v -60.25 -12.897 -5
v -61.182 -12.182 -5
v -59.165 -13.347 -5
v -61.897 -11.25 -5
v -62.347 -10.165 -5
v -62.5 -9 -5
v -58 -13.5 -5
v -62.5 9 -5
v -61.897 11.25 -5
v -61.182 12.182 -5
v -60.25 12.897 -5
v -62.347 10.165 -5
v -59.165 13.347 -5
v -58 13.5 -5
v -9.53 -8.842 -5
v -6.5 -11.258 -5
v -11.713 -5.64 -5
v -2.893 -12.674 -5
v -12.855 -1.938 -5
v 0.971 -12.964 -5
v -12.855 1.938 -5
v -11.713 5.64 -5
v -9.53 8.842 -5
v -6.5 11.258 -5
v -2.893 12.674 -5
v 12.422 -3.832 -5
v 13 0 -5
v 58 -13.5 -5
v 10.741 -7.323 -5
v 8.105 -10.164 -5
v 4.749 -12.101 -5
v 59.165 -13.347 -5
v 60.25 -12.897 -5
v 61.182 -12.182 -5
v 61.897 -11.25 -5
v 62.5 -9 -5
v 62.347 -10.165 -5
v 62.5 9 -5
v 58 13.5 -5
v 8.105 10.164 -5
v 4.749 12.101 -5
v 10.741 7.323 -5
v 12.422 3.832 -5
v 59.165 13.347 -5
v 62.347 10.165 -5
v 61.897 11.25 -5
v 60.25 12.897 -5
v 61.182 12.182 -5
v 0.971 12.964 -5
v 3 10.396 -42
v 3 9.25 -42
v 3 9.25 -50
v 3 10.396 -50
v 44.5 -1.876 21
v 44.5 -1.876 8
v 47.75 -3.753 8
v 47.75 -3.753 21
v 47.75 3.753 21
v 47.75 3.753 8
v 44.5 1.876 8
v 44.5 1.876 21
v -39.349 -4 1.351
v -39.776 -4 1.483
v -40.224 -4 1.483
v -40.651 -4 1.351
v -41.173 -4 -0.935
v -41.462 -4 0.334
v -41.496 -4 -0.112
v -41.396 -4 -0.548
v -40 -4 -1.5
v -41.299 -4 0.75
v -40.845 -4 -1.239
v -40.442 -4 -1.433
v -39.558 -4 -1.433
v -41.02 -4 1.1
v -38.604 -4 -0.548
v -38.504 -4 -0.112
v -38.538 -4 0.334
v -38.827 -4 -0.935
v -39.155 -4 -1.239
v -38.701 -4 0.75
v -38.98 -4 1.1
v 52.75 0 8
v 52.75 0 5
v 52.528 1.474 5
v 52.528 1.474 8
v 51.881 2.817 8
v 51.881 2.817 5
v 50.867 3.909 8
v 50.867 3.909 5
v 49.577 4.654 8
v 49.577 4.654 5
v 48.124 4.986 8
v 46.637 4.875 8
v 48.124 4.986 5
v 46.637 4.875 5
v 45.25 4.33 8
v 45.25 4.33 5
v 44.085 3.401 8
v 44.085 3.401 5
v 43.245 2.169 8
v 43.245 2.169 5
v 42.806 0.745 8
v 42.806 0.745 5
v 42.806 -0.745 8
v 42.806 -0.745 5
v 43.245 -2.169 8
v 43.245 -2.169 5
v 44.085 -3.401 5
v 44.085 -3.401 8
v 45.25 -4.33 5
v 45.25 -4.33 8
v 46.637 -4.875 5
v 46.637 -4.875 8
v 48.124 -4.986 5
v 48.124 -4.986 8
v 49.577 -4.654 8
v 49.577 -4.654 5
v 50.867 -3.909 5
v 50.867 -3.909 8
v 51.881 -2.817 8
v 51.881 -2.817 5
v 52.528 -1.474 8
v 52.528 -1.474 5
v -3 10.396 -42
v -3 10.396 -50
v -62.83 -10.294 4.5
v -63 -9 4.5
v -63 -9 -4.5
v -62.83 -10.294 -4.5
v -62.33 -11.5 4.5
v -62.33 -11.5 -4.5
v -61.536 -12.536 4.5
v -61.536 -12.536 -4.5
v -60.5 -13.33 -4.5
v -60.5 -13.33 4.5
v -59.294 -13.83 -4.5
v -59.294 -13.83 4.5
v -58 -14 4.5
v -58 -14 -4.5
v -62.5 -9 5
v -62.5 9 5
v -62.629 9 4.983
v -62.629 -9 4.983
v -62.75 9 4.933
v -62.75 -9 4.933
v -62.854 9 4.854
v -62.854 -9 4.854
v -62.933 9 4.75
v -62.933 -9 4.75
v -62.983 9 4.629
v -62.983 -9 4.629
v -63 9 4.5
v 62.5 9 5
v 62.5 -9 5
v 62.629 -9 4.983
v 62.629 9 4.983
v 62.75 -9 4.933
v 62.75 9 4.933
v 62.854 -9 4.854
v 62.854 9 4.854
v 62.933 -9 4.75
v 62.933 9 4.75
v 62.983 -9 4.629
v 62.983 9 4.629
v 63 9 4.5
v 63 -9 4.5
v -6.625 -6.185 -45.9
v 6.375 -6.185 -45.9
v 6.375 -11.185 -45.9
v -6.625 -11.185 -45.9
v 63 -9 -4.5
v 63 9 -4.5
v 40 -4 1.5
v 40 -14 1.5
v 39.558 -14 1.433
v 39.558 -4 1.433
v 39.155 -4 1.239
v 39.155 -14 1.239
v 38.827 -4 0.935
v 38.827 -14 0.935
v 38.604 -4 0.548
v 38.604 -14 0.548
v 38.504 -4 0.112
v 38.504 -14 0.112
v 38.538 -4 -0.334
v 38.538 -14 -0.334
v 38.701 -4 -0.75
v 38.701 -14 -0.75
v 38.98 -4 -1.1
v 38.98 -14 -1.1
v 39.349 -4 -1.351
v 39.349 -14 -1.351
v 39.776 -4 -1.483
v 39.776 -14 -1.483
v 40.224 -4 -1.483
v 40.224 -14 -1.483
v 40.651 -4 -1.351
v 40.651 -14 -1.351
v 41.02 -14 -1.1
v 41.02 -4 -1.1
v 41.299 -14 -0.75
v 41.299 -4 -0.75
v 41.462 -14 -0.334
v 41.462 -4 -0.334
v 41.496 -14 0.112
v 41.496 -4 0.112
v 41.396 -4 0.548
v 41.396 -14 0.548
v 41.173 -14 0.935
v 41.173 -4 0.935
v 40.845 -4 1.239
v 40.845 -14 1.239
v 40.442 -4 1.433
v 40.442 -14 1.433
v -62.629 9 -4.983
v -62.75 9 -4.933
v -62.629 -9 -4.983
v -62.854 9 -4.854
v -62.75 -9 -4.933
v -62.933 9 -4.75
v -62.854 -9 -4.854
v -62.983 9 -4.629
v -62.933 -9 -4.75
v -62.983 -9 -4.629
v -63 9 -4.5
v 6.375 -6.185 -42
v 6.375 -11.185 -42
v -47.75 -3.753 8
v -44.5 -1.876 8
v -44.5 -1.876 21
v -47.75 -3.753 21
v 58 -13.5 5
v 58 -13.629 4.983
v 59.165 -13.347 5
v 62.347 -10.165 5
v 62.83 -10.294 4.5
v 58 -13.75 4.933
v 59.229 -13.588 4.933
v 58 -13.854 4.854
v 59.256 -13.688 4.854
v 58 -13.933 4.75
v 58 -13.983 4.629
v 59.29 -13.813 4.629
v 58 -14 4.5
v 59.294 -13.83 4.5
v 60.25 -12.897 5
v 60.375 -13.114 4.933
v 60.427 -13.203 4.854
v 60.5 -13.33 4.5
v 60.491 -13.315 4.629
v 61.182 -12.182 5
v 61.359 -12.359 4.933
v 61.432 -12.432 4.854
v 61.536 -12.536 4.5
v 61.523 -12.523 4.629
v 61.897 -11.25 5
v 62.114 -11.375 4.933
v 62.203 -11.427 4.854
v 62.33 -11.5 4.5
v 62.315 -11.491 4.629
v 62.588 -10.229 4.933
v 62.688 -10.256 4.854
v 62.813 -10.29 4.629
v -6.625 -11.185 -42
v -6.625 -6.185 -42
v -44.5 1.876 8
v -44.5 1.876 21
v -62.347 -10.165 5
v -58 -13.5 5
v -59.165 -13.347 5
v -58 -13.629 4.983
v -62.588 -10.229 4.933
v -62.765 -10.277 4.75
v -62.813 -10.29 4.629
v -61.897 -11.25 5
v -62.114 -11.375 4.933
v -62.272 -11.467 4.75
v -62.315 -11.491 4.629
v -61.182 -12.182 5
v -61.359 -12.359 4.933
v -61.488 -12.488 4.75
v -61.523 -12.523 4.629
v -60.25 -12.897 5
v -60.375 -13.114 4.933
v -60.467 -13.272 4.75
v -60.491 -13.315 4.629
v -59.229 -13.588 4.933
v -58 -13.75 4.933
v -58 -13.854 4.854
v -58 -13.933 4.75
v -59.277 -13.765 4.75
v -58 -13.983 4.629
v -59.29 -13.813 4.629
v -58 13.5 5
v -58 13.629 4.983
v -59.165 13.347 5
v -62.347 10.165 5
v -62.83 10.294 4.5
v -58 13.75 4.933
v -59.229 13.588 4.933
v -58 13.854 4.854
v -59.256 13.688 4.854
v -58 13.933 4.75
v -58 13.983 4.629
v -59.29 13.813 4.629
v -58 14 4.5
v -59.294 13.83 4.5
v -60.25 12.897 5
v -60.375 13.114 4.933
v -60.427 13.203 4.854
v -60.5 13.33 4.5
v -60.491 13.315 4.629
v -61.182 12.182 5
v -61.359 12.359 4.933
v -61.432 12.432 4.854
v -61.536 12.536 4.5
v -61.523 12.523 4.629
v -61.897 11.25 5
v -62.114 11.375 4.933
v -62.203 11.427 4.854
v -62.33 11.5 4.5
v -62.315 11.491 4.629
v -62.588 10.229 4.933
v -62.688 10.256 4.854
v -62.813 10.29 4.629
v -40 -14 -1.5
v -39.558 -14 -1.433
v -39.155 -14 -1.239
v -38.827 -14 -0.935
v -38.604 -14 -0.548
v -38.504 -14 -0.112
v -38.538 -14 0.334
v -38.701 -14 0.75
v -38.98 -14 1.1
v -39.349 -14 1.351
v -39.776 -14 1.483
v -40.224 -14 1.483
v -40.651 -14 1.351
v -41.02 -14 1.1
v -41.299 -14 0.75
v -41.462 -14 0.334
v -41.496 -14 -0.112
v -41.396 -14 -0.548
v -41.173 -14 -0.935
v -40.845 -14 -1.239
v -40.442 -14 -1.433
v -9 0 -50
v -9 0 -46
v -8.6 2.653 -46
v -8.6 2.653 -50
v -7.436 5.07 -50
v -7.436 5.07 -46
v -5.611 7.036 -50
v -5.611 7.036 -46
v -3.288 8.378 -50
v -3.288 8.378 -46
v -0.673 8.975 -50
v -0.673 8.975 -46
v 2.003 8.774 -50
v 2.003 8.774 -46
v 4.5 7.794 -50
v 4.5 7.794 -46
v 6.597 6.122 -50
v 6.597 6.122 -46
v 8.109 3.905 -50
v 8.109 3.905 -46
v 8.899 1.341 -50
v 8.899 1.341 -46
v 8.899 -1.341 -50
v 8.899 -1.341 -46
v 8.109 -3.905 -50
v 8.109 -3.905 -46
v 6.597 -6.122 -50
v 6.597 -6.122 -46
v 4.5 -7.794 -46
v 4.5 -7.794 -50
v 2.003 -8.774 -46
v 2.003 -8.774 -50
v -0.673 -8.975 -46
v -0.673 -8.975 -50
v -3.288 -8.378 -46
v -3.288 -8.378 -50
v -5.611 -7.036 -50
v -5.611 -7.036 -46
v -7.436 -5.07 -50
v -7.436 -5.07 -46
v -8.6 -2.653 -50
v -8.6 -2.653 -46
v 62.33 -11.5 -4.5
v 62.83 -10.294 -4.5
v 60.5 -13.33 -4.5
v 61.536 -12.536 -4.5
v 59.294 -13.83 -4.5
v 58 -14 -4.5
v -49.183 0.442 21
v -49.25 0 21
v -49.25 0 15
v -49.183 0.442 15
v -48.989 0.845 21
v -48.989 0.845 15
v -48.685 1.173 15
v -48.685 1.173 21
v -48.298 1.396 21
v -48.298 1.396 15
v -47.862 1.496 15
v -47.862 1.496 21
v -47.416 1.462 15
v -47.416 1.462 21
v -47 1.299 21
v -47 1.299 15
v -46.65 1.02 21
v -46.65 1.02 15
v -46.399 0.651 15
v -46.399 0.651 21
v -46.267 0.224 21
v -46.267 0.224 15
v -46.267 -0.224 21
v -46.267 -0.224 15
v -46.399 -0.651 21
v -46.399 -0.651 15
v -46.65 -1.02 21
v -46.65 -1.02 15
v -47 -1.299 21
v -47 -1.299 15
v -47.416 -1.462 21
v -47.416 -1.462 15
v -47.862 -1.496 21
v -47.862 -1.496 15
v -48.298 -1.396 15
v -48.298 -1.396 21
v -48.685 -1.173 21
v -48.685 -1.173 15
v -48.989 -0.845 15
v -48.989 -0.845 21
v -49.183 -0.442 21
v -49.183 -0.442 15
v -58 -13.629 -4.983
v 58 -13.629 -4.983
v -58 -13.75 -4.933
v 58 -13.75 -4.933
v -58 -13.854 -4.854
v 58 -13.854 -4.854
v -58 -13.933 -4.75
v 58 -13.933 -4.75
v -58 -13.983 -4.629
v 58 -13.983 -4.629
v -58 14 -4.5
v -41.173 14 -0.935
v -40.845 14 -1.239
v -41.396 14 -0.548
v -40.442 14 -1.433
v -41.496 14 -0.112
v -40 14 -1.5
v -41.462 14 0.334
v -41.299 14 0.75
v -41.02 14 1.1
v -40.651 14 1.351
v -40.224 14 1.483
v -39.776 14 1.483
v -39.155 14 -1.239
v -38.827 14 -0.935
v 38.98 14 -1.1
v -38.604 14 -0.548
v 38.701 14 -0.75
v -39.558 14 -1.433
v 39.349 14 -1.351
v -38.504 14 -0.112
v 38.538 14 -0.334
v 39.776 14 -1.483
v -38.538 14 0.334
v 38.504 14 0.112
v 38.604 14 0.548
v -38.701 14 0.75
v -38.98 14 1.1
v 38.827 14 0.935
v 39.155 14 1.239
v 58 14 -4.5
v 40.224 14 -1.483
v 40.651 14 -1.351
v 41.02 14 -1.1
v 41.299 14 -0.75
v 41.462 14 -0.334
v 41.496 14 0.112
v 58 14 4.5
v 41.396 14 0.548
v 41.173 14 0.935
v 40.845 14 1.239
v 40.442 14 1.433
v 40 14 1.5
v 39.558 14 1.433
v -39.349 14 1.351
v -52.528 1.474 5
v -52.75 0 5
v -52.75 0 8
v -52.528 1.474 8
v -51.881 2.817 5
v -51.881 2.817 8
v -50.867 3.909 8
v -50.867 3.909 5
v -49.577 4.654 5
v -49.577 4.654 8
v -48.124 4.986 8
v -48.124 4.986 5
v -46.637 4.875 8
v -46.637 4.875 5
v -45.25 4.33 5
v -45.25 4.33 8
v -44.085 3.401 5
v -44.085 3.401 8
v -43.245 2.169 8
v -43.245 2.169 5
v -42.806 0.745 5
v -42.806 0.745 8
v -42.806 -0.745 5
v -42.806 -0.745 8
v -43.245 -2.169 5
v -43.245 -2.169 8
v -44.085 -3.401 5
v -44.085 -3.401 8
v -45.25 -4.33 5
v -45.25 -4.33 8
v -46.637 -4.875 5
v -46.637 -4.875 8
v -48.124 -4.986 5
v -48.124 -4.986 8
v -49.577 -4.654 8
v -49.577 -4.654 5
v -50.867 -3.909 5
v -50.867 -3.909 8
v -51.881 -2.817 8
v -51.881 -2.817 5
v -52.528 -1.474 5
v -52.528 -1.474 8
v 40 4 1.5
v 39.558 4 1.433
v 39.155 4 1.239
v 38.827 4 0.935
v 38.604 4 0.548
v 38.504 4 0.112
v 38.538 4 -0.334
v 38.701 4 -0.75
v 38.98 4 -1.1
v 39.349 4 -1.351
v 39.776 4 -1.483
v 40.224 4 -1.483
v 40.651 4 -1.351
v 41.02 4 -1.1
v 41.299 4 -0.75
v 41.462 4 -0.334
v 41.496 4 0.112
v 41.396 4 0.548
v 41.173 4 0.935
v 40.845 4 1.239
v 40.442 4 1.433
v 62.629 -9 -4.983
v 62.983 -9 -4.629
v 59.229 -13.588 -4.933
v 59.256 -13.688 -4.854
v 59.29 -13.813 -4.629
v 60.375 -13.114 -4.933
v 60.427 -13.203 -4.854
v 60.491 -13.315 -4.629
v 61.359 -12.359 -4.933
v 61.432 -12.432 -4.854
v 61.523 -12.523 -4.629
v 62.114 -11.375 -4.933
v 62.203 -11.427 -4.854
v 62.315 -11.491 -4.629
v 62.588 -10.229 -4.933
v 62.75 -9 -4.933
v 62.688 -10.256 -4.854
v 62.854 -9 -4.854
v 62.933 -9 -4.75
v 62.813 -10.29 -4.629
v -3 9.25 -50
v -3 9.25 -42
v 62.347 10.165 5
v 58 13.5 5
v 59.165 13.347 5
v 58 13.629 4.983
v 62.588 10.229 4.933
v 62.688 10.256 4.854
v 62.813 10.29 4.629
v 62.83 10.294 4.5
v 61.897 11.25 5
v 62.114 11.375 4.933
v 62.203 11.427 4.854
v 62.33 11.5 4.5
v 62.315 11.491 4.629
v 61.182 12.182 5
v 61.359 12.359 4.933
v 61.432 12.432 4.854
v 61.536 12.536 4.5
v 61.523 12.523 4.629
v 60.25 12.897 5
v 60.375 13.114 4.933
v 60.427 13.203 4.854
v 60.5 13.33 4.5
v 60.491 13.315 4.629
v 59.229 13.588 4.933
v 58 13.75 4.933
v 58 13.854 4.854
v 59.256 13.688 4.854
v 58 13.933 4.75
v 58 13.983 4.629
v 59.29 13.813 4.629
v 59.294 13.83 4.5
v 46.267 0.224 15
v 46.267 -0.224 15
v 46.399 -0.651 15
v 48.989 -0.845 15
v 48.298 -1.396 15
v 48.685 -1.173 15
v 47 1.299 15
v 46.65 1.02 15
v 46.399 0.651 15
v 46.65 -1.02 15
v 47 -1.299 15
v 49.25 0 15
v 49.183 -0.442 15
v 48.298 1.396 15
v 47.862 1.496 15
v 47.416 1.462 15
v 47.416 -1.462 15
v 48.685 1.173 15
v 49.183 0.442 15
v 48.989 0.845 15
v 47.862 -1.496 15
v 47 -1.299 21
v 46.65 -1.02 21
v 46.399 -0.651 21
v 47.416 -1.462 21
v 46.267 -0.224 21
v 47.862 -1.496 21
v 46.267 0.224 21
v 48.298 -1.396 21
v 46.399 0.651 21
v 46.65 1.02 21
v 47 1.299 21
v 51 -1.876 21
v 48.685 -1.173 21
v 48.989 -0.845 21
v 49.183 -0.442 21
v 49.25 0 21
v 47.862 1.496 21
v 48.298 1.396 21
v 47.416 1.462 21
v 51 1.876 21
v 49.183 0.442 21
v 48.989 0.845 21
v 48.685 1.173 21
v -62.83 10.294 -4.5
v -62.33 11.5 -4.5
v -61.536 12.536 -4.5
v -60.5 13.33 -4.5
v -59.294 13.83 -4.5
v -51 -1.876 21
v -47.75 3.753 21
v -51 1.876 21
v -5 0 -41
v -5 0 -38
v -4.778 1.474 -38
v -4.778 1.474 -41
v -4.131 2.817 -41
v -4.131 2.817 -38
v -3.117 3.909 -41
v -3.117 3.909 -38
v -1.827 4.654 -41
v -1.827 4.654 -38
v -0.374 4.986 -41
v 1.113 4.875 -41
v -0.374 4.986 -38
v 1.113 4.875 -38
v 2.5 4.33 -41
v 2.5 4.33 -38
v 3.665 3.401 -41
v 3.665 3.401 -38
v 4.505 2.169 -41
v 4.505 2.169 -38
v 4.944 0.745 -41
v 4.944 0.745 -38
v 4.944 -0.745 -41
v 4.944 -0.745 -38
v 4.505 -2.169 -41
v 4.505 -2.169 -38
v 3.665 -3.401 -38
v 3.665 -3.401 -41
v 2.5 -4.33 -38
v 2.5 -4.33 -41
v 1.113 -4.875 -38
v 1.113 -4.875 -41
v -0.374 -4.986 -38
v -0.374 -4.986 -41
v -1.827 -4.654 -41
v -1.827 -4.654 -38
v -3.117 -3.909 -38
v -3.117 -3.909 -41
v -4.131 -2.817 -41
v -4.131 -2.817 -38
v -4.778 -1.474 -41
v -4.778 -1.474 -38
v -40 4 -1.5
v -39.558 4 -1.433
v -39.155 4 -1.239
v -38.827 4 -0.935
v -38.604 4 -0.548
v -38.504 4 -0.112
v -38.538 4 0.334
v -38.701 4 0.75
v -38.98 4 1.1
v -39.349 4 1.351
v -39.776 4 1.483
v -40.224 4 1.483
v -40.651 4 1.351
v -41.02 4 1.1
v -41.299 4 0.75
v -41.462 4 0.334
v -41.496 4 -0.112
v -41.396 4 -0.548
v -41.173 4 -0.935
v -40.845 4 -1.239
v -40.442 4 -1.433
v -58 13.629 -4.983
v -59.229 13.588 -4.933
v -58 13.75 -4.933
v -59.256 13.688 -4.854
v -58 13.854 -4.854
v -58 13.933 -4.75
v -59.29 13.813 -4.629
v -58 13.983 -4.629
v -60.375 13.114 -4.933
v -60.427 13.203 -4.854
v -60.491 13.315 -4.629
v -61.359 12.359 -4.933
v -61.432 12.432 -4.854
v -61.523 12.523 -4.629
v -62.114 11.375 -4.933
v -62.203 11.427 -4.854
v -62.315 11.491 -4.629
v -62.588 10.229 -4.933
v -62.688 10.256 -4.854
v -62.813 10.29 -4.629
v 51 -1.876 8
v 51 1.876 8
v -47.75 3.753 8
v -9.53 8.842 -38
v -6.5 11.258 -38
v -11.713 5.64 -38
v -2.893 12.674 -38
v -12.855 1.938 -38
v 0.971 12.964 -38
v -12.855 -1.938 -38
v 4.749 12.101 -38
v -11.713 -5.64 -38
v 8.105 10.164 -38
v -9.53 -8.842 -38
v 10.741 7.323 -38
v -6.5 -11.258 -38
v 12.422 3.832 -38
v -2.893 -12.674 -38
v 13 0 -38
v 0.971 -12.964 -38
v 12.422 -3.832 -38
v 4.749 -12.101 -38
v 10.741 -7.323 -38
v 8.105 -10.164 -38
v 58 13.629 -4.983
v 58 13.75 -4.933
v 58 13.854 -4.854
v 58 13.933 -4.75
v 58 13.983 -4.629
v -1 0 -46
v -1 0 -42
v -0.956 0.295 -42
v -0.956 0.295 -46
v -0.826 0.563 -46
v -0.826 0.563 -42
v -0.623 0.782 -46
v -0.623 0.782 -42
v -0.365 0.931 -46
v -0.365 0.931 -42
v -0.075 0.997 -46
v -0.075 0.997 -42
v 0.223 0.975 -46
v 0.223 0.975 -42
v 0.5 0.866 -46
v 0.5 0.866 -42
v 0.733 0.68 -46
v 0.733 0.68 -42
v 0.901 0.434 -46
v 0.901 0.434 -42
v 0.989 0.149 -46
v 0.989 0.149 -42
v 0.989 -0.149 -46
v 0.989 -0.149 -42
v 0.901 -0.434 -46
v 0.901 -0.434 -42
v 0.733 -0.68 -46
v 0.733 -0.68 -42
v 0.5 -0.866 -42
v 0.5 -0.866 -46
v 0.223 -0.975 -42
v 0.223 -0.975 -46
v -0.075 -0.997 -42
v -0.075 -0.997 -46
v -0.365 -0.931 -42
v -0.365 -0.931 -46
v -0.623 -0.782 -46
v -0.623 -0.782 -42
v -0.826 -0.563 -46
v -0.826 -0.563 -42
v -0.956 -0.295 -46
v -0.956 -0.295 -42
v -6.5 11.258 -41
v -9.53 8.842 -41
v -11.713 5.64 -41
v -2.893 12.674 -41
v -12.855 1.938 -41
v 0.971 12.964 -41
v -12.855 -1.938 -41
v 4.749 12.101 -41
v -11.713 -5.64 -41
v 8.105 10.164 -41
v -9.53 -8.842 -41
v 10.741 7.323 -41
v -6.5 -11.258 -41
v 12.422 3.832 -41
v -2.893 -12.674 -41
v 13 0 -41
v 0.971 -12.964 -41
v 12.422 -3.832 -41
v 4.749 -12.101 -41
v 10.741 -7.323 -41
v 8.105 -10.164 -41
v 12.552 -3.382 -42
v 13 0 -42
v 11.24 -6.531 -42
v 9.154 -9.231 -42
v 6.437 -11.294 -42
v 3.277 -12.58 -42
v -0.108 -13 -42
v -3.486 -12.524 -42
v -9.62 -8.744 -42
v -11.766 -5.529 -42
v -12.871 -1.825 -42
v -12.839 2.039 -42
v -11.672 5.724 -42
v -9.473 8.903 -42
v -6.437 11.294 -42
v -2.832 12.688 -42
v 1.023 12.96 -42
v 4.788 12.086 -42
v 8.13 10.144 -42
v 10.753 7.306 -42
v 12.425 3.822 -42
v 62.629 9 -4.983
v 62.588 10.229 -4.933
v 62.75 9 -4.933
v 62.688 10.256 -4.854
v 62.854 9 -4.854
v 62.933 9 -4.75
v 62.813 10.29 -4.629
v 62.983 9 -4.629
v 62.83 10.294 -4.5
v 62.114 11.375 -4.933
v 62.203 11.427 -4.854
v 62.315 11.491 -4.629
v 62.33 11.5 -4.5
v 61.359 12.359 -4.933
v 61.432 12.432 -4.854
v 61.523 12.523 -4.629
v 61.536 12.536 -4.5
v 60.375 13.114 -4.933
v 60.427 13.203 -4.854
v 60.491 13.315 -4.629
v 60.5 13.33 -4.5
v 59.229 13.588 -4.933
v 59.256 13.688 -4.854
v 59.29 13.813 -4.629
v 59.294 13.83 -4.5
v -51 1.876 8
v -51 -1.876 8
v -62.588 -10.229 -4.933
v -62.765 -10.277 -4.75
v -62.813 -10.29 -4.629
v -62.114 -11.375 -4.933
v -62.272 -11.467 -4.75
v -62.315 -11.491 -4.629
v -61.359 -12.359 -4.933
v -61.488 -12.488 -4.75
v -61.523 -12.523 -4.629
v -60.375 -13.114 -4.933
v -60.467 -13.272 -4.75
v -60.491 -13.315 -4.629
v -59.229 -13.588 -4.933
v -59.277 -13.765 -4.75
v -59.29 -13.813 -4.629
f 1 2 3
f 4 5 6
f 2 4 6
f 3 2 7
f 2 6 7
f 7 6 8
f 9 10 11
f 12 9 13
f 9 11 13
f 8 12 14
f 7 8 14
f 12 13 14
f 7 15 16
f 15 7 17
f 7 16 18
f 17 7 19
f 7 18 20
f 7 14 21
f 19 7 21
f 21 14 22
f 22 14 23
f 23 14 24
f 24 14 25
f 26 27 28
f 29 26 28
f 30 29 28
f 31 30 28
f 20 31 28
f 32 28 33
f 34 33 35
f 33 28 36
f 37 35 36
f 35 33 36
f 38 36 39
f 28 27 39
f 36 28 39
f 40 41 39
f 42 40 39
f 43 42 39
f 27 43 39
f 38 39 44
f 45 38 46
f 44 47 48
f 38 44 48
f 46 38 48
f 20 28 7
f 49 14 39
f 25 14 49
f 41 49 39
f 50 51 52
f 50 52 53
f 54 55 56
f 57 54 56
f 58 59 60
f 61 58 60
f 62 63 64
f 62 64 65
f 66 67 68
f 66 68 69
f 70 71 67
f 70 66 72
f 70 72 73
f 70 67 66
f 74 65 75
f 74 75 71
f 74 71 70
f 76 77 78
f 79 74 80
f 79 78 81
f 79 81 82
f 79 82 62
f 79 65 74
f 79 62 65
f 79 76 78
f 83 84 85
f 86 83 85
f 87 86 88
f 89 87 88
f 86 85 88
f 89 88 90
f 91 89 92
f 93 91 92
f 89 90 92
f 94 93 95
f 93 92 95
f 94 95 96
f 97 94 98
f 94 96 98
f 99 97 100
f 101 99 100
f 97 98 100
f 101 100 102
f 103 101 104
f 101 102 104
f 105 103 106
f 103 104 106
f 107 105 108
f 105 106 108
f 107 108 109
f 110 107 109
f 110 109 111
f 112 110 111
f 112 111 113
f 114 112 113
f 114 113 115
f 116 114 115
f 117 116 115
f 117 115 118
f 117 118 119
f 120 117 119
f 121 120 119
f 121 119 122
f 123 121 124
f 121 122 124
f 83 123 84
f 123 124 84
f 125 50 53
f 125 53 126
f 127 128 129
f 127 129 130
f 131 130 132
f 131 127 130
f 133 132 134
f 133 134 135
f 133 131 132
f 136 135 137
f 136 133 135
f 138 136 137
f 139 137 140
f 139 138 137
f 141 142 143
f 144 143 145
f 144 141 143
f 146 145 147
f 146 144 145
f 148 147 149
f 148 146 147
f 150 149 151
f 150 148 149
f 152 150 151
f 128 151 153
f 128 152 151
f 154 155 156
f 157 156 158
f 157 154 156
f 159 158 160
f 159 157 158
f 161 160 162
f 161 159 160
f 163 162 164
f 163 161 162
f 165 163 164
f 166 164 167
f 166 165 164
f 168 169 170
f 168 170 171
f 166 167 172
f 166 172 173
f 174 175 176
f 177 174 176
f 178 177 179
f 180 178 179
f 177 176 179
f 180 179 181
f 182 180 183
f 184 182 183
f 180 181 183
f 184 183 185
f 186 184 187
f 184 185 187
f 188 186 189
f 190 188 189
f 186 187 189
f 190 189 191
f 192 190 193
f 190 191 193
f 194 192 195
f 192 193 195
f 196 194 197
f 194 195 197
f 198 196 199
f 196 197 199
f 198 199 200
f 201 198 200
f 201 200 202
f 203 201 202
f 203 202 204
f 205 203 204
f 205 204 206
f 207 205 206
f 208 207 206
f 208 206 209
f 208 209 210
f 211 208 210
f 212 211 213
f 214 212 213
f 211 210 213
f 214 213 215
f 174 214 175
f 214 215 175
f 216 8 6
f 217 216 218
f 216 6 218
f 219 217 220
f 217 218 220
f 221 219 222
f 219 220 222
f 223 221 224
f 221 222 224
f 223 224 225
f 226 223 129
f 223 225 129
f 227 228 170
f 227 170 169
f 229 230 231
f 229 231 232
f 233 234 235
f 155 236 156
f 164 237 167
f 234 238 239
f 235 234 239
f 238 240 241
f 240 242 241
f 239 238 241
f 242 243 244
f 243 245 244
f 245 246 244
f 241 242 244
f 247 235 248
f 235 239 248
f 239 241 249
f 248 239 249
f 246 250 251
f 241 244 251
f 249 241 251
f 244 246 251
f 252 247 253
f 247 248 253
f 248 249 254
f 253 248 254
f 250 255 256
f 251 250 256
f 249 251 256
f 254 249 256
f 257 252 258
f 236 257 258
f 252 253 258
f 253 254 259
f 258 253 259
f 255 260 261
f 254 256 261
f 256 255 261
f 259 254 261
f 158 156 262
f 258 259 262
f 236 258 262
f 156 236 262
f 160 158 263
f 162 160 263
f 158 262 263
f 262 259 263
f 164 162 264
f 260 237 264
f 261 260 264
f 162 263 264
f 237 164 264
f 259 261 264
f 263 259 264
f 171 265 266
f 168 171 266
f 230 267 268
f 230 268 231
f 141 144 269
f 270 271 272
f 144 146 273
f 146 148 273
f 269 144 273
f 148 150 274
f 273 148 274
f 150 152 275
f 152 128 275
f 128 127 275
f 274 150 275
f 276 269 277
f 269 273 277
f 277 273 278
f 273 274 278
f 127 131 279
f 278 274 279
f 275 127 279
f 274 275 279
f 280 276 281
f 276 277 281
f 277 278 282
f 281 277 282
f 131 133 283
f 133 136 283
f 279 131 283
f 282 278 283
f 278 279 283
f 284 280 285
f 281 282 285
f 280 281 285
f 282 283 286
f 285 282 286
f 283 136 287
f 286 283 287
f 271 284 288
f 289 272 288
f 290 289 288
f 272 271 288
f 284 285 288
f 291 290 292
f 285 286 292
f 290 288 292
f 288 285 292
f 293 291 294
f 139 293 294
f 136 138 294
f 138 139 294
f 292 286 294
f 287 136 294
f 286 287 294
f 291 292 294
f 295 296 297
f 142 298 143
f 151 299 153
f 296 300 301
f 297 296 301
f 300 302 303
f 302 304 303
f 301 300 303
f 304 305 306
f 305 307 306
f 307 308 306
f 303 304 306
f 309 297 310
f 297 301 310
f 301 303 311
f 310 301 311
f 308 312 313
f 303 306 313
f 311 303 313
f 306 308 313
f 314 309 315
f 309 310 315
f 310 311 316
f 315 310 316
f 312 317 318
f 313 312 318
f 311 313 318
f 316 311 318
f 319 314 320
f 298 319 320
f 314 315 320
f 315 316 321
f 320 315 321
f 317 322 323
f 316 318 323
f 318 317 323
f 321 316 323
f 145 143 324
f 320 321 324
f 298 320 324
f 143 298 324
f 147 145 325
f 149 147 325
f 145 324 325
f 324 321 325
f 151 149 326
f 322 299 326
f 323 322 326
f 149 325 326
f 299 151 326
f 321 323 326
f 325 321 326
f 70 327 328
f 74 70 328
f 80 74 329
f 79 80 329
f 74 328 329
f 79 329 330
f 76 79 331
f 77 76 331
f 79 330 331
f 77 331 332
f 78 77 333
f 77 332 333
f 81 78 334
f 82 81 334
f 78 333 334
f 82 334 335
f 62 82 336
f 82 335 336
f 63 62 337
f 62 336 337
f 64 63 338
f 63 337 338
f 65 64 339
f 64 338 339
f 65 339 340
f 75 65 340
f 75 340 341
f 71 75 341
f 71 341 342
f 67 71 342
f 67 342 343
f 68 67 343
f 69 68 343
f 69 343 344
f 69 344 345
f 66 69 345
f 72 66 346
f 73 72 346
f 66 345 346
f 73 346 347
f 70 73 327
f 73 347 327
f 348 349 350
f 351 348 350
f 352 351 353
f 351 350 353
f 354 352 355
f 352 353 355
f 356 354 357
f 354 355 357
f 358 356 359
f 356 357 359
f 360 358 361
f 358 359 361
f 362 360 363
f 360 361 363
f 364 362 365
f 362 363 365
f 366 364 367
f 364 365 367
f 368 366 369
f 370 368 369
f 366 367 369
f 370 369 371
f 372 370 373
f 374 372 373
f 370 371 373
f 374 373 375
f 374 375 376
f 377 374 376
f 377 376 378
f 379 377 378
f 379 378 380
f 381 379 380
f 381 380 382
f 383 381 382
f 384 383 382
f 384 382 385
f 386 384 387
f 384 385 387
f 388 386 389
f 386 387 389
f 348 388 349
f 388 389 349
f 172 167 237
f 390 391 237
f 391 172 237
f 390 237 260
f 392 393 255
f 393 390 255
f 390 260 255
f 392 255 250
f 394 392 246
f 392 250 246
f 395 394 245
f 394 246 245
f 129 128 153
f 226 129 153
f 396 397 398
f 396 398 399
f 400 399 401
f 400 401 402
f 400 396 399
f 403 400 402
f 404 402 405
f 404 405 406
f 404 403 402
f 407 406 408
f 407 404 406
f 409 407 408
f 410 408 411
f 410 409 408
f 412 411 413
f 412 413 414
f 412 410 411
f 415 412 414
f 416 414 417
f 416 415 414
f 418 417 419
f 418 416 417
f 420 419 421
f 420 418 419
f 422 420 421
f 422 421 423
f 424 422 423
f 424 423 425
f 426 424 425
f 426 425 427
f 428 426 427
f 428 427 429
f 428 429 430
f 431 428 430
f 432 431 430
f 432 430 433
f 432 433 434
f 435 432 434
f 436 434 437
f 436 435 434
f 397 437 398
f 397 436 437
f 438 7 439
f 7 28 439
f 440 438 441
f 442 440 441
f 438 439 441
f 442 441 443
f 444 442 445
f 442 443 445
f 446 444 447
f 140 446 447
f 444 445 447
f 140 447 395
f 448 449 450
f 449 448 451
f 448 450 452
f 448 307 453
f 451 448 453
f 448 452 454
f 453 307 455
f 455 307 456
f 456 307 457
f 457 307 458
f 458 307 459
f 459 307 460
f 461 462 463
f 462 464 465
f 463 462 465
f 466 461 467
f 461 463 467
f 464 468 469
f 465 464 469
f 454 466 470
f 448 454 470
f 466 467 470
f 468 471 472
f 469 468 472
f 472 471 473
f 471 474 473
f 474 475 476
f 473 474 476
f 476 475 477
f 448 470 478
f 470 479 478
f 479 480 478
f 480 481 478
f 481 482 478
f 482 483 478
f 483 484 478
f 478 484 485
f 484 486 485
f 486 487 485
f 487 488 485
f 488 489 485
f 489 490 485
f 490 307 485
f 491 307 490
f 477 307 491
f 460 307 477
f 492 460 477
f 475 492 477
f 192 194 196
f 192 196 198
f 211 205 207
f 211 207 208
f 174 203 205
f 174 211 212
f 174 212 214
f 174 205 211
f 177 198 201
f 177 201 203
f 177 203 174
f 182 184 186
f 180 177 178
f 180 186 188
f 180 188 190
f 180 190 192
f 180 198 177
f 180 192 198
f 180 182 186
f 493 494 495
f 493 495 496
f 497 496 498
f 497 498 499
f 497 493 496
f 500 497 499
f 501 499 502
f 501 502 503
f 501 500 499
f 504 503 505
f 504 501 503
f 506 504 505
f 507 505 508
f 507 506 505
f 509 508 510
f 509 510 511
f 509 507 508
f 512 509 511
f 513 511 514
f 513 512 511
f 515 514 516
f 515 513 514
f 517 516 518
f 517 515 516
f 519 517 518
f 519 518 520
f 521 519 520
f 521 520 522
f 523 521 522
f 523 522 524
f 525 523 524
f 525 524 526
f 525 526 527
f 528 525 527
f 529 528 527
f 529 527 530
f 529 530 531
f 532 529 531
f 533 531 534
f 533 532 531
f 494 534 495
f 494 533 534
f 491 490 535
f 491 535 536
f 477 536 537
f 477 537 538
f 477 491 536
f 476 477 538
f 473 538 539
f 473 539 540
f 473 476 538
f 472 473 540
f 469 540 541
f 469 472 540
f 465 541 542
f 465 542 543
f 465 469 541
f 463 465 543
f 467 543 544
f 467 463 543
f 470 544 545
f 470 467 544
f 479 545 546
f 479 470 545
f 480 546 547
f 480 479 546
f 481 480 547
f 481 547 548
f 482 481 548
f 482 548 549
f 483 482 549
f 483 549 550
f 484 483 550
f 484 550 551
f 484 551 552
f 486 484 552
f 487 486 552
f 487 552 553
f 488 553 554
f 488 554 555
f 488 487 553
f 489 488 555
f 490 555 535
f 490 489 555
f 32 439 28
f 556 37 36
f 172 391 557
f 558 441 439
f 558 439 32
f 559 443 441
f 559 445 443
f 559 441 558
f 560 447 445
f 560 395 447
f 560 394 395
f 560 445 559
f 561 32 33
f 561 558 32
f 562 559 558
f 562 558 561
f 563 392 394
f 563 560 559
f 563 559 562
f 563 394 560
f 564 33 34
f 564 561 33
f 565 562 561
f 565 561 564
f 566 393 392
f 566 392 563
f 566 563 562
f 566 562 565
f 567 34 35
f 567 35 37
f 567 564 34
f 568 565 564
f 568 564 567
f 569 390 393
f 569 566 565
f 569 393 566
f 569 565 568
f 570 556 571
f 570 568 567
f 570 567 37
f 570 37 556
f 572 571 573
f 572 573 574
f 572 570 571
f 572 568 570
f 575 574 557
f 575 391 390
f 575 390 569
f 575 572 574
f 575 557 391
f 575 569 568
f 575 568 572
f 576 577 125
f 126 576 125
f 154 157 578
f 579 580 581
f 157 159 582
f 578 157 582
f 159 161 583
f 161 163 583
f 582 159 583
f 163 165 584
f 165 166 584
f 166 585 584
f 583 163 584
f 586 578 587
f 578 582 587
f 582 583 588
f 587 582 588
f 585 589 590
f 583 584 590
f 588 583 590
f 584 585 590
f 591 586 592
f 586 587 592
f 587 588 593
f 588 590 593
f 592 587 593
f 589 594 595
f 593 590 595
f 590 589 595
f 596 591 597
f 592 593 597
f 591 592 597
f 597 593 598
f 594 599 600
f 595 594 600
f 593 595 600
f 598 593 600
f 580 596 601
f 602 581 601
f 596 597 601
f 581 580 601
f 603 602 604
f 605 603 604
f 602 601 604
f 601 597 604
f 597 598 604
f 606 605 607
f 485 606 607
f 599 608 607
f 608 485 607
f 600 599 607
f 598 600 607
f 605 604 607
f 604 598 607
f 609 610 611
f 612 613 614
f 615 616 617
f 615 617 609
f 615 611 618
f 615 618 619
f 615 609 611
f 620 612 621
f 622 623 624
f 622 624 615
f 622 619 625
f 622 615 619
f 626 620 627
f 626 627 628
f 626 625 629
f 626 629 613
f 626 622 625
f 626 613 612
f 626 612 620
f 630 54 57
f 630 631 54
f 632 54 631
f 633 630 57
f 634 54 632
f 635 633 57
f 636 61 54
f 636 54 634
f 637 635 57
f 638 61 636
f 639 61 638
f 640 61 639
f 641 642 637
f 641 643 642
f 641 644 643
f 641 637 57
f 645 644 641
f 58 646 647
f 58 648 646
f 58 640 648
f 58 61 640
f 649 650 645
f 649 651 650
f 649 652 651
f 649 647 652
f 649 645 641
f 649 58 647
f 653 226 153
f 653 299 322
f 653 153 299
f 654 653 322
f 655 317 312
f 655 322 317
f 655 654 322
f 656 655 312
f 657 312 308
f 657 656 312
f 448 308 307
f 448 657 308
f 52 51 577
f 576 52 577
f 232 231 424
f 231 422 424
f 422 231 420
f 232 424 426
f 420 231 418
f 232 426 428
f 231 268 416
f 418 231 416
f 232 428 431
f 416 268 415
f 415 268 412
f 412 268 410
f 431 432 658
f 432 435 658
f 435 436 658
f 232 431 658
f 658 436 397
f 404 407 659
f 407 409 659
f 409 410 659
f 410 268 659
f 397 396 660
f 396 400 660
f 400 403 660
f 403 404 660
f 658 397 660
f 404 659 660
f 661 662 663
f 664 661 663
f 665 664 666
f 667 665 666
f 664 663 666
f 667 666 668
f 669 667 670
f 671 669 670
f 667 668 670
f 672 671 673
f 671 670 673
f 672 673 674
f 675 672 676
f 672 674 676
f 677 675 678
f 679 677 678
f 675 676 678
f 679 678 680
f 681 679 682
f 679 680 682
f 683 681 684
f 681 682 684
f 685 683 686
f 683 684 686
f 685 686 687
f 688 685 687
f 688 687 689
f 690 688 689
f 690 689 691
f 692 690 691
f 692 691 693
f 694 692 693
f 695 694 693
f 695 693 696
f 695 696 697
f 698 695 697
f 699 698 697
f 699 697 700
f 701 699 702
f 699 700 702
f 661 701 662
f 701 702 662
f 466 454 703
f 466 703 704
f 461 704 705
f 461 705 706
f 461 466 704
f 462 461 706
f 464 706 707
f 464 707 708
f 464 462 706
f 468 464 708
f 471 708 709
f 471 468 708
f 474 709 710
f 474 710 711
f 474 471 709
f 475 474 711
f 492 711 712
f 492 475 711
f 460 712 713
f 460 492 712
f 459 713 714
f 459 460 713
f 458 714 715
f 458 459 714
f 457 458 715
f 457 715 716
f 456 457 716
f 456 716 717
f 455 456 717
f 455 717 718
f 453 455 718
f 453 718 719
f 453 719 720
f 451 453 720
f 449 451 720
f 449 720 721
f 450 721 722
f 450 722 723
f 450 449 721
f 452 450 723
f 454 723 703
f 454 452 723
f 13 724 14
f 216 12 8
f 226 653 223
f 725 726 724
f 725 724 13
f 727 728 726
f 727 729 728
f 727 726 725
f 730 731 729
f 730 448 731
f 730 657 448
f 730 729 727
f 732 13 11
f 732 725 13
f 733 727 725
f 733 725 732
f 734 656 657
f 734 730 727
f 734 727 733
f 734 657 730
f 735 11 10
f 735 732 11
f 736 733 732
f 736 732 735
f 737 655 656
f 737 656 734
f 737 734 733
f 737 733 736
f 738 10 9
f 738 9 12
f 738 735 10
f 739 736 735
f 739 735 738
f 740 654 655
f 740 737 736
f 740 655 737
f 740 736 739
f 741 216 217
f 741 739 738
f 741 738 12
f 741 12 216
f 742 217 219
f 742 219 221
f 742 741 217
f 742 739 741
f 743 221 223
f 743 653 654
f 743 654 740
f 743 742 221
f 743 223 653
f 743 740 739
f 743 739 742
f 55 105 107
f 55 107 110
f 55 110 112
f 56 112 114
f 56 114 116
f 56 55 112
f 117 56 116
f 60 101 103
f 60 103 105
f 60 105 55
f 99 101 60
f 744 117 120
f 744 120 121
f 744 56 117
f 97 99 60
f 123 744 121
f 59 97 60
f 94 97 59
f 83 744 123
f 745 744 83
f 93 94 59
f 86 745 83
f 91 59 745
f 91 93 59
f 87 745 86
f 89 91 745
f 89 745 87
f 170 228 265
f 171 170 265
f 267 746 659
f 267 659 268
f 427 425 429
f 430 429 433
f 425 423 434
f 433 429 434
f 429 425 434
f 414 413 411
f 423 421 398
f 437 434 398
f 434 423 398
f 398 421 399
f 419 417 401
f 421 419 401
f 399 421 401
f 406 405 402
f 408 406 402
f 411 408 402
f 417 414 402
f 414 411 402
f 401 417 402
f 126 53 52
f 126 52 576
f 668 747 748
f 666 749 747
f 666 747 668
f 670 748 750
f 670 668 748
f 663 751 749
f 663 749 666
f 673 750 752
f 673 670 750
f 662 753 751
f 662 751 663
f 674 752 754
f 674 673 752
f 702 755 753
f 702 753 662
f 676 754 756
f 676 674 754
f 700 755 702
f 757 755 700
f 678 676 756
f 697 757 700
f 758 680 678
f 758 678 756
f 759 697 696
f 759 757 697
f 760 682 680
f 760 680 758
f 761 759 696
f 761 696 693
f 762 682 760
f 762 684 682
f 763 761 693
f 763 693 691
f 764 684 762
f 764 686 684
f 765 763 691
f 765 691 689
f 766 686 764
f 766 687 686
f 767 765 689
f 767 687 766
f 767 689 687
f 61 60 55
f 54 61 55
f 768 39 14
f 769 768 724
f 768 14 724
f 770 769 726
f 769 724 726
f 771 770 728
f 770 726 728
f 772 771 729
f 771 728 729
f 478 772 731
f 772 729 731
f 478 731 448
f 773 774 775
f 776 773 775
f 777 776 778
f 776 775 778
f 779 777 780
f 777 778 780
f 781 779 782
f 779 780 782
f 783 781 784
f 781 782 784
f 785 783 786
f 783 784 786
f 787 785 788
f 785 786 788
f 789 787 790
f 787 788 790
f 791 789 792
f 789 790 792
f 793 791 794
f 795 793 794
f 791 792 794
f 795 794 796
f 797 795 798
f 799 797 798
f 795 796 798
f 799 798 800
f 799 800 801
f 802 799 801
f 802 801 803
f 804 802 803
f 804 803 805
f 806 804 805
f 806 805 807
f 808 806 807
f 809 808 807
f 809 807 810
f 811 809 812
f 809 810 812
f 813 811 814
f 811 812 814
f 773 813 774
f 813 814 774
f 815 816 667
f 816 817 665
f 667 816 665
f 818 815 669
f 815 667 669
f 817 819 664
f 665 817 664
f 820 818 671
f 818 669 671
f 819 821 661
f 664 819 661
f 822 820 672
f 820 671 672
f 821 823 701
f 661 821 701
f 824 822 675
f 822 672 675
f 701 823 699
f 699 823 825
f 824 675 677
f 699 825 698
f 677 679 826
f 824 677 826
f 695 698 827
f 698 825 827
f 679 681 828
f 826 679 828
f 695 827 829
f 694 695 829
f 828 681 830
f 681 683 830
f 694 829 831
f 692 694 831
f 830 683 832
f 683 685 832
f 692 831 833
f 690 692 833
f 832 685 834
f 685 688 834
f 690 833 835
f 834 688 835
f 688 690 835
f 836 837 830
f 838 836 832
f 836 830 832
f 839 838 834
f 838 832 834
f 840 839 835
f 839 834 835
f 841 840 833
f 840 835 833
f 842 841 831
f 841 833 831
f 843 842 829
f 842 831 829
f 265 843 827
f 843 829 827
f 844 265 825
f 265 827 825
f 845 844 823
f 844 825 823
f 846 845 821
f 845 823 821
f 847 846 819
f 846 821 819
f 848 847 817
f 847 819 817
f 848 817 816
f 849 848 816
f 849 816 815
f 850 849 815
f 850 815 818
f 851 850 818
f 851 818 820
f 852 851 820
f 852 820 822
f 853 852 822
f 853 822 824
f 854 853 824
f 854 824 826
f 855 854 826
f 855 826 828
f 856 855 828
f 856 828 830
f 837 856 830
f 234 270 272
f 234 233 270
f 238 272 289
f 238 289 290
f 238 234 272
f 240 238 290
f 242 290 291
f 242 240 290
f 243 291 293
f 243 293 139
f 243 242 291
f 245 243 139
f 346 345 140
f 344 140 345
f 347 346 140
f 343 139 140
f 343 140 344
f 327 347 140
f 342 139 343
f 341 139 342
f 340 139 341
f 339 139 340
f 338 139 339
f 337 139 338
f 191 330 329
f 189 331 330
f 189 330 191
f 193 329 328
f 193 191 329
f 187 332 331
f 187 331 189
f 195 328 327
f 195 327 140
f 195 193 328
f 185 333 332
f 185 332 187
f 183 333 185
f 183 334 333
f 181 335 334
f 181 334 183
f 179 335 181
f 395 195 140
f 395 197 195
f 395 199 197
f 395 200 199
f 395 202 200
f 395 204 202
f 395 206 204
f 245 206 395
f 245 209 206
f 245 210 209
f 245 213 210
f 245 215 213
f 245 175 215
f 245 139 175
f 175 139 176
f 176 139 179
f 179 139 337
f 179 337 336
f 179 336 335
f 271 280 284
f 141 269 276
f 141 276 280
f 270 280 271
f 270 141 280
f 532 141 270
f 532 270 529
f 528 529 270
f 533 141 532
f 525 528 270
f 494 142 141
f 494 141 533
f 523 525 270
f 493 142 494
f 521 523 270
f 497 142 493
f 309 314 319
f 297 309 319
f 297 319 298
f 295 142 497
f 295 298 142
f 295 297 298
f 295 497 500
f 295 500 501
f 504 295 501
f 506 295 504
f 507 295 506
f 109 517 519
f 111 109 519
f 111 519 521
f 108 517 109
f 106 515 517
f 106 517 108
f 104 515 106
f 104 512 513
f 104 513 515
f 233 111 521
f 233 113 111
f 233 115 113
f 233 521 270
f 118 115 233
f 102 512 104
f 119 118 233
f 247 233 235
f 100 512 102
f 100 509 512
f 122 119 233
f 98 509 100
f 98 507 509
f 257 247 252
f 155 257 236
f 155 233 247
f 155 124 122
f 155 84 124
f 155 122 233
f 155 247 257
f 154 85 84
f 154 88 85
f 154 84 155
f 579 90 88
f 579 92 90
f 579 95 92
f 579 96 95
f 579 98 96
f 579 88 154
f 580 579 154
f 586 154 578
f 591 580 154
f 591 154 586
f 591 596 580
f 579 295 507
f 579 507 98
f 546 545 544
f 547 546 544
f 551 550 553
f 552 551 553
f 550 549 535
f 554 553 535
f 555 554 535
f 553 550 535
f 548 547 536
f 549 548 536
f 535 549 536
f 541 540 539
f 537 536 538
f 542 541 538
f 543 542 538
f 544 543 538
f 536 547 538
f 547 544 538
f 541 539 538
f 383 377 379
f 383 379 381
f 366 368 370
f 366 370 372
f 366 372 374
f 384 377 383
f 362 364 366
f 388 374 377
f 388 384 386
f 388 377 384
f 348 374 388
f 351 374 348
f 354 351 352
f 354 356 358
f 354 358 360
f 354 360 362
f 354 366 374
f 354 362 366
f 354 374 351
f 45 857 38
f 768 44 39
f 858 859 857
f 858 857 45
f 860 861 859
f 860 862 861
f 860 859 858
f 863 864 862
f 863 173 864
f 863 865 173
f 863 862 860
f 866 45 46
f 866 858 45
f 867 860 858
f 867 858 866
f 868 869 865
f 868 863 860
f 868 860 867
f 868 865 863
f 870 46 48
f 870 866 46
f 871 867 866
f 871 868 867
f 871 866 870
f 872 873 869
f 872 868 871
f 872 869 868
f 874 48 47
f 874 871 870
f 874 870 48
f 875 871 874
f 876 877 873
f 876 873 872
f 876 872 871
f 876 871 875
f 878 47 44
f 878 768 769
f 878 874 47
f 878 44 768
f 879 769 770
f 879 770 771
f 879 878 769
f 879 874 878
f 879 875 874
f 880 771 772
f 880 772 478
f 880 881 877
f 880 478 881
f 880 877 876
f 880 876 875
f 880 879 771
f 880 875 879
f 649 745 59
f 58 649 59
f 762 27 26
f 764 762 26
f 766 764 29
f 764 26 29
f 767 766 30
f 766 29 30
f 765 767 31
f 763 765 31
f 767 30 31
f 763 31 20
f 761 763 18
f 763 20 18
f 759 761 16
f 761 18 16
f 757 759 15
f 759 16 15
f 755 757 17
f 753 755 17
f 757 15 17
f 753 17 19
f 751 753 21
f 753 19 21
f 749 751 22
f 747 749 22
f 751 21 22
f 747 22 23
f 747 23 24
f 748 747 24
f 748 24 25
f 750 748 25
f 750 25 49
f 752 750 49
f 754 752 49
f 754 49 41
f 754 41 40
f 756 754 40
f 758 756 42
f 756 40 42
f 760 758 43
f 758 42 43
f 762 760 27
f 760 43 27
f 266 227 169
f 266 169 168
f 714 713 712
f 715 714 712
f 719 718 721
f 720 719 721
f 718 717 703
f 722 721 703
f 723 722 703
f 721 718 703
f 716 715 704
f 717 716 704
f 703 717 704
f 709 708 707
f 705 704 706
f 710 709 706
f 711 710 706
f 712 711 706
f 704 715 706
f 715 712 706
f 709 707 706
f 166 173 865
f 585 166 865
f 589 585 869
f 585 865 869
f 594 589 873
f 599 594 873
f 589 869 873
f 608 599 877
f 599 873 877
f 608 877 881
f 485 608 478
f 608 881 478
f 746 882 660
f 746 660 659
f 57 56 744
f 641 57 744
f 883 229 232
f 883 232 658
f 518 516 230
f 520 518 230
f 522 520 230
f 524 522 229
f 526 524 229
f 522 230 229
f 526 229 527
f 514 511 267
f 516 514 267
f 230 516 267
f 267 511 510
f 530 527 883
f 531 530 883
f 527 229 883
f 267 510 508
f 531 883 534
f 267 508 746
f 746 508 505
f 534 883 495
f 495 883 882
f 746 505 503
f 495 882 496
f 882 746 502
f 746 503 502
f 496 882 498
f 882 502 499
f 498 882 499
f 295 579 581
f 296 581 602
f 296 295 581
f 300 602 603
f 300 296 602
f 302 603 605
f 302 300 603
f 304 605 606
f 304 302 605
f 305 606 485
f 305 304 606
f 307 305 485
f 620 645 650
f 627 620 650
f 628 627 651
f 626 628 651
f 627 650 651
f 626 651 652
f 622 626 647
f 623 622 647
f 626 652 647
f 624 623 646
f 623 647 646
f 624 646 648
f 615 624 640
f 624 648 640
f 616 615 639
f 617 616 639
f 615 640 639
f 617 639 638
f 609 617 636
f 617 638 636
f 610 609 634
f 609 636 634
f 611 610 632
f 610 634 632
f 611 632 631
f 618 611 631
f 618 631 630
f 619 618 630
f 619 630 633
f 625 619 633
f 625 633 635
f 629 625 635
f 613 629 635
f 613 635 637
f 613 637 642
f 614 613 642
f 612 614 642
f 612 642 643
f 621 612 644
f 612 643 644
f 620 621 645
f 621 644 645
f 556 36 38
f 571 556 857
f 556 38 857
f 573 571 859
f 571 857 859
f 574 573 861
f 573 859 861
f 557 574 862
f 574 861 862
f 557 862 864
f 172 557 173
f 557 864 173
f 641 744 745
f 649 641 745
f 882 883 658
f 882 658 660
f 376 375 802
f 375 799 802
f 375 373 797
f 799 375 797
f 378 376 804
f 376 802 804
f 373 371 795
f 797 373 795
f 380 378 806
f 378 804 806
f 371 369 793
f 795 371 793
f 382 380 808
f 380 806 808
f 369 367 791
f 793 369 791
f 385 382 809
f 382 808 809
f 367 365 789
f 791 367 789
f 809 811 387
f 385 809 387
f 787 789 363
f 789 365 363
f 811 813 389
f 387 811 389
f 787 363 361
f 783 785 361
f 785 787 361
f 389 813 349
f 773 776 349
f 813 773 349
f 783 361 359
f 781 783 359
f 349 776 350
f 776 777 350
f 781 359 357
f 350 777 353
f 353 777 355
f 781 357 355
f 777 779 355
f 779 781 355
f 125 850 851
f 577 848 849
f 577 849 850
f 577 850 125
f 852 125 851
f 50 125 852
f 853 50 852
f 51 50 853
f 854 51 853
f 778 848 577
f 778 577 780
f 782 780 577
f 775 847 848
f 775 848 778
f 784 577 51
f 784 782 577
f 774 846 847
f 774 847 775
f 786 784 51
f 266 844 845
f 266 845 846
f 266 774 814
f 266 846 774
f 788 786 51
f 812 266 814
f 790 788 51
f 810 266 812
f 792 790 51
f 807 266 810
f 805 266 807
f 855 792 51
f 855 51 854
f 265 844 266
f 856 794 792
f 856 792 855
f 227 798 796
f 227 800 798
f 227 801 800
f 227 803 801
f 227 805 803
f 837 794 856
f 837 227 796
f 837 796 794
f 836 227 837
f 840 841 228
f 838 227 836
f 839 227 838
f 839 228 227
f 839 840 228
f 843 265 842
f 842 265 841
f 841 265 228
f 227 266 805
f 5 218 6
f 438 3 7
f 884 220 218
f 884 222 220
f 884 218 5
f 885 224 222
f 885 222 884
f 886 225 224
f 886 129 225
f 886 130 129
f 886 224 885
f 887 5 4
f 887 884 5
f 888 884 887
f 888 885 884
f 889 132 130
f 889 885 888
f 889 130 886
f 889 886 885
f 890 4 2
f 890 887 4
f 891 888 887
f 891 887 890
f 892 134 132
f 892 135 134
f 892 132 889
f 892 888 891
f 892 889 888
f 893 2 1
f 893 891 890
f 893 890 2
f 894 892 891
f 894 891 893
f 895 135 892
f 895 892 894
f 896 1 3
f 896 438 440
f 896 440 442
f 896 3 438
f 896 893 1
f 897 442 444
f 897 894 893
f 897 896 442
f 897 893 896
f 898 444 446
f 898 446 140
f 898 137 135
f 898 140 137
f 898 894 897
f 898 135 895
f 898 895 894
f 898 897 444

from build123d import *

# Parameters (mm, degrees)
SKETCH_1_W          = 126
SKETCH_1_H          = 28
EXTRUDE_1_DEPTH     = 5
FILLET_1_R          = 5
FILLET_2_R          = 0.5
SKETCH_3_R          = 1.5
CUT_EXTRUDE_1_DEPTH = 10
SKETCH_4_R          = 5
EXTRUDE_2_DEPTH     = 3
EXTRUDE_3_DEPTH     = 13
SKETCH_6_R          = 1.5
CUT_EXTRUDE_2_DEPTH = 6
SKETCH_7_R          = 13
EXTRUDE_4_DEPTH     = 33
SKETCH_8_R          = 5
EXTRUDE_5_DEPTH     = 3
SKETCH_9_R          = 13
EXTRUDE_6_DEPTH     = 1
SKETCH_10_R         = 1
EXTRUDE_7_DEPTH     = 4
SKETCH_11_R         = 9
EXTRUDE_8_DEPTH     = 4
SKETCH_12_W         = 6
SKETCH_12_H         = 1.146117225
EXTRUDE_9_DEPTH     = 8
SKETCH_13_W         = 13
SKETCH_13_H         = 5
EXTRUDE_10_DEPTH    = 3.9


with BuildPart() as part:
    # 草图1 → 凸台-拉伸1 (new, symmetric)
    with BuildSketch(Plane.XY):
        Rectangle(SKETCH_1_W, SKETCH_1_H)
    extrude(amount=EXTRUDE_1_DEPTH, both=True)

    # 圆角1
    fillet_1_edges = [part.edges().sort_by_distance(p)[0] for p in [
        (63, -14, 0),
        (-63, -14, 0),
        (-63, 14, 0),
        (63, 14, 0),
    ]]
    fillet(fillet_1_edges, radius=FILLET_1_R)

    # 圆角2
    fillet_2_edges = [part.edges().sort_by_distance(p)[0] for p in [
        (0, -14, -5),
        (0, -14, 5),
        (63, 0, -5),
        (-63, 0, -5),
        (0, 14, -5),
        (61.535533906, 12.535533906, -5),
        (61.535533906, -12.535533906, -5),
        (-61.535533906, 12.535533906, -5),
        (-61.535533906, -12.535533906, -5),
        (-63, 0, 5),
        (63, 0, 5),
        (0, 14, 5),
        (61.535533906, 12.535533906, 5),
        (61.535533906, -12.535533906, 5),
        (-61.535533906, 12.535533906, 5),
        (-61.535533906, -12.535533906, 5),
    ]]
    fillet(fillet_2_edges, radius=FILLET_2_R)

    # 草图3 → 切除-拉伸1 (cut)
    with BuildSketch(Plane.XZ.offset(14)):
        with Locations(Location((-40, 0, 0), (0, 0, 270))):
            Circle(SKETCH_3_R)
        with Locations(Location((40, 0, 0), (0, 0, 90))):
            Circle(SKETCH_3_R)
    cut_extrude_1 = extrude(amount=-CUT_EXTRUDE_1_DEPTH, mode=Mode.SUBTRACT)

    # 草图4 → 凸台-拉伸2 (add)
    with BuildSketch(Plane.XY.offset(5)):
        with Locations((47.75, 0)):
            Circle(SKETCH_4_R)
    extrude_2 = extrude(amount=EXTRUDE_2_DEPTH)

    # 草图5 → 凸台-拉伸3 (add)
    with BuildSketch(Plane.XY.offset(8)):
        Polygon((47.75, -3.75277675), (51, -1.876388375), (51, 1.876388375), (47.75, 3.75277675), (44.5, 1.876388375), (44.5, -1.876388375), align=None)
    extrude_3 = extrude(amount=EXTRUDE_3_DEPTH)

    # 草图6 → 切除-拉伸2 (cut)
    with BuildSketch(Plane.XY.offset(21)):
        with Locations((47.75, 0)):
            Circle(SKETCH_6_R)
    cut_extrude_2 = extrude(amount=-CUT_EXTRUDE_2_DEPTH, mode=Mode.SUBTRACT)

    # 镜向1: 凸台-拉伸2, 凸台-拉伸3, 切除-拉伸2 across plane
    add(extrude_2.mirror(Plane(origin=(0, 0, 0), x_dir=(0, 0, 1), z_dir=(1, 0, 0))))
    add(extrude_3.mirror(Plane(origin=(0, 0, 0), x_dir=(0, 0, 1), z_dir=(1, 0, 0))))
    add(cut_extrude_2.mirror(Plane(origin=(0, 0, 0), x_dir=(0, 0, 1), z_dir=(1, 0, 0))), mode=Mode.SUBTRACT)

    # 草图7 → 凸台-拉伸4 (add)
    with BuildSketch(Plane(origin=(0, 0, -5), x_dir=(-1, 0, 0), z_dir=(0, 0, -1))):
        with Locations(Location((0, 0, 0), (0, 0, 180))):
            Circle(SKETCH_7_R)
    extrude(amount=EXTRUDE_4_DEPTH)

    # 草图8 → 凸台-拉伸5 (add)
    with BuildSketch(Plane(origin=(0, 0, -38), x_dir=(-1, 0, 0), z_dir=(0, 0, -1))):
        Circle(SKETCH_8_R)
    extrude(amount=EXTRUDE_5_DEPTH)

    # 草图9 → 凸台-拉伸6 (add)
    with BuildSketch(Plane(origin=(0, 0, -41), x_dir=(-1, 0, 0), z_dir=(0, 0, -1))):
        with Locations(Location((0, 0, 0), (0, 0, 180))):
            Circle(SKETCH_9_R)
    extrude(amount=EXTRUDE_6_DEPTH)

    # 草图10 → 凸台-拉伸7 (add)
    with BuildSketch(Plane(origin=(0, 0, -42), x_dir=(-1, 0, 0), z_dir=(0, 0, -1))):
        Circle(SKETCH_10_R)
    extrude(amount=EXTRUDE_7_DEPTH)

    # 草图11 → 凸台-拉伸8 (add)
    with BuildSketch(Plane(origin=(0, 0, -46), x_dir=(-1, 0, 0), z_dir=(0, 0, -1))):
        Circle(SKETCH_11_R)
    extrude(amount=EXTRUDE_8_DEPTH)

    # 草图12 → 凸台-拉伸9 (add)
    with BuildSketch(Plane(origin=(0, 0, -42), x_dir=(-1, 0, 0), z_dir=(0, 0, -1))):
        with Locations((0, 9.822897289)):
            Rectangle(SKETCH_12_W, SKETCH_12_H)
    extrude(amount=EXTRUDE_9_DEPTH)

    # 草图13 → 凸台-拉伸10 (add)
    with BuildSketch(Plane(origin=(0, 0, -42), x_dir=(-1, 0, 0), z_dir=(0, 0, -1))):
        with Locations((0.124599067, -8.685467679)):
            Rectangle(SKETCH_13_W, SKETCH_13_H)
    extrude(amount=EXTRUDE_10_DEPTH)

    # 镜向2: 切除-拉伸1 across plane
    add(cut_extrude_1.mirror(Plane.ZX), mode=Mode.SUBTRACT)


solid = part.part
